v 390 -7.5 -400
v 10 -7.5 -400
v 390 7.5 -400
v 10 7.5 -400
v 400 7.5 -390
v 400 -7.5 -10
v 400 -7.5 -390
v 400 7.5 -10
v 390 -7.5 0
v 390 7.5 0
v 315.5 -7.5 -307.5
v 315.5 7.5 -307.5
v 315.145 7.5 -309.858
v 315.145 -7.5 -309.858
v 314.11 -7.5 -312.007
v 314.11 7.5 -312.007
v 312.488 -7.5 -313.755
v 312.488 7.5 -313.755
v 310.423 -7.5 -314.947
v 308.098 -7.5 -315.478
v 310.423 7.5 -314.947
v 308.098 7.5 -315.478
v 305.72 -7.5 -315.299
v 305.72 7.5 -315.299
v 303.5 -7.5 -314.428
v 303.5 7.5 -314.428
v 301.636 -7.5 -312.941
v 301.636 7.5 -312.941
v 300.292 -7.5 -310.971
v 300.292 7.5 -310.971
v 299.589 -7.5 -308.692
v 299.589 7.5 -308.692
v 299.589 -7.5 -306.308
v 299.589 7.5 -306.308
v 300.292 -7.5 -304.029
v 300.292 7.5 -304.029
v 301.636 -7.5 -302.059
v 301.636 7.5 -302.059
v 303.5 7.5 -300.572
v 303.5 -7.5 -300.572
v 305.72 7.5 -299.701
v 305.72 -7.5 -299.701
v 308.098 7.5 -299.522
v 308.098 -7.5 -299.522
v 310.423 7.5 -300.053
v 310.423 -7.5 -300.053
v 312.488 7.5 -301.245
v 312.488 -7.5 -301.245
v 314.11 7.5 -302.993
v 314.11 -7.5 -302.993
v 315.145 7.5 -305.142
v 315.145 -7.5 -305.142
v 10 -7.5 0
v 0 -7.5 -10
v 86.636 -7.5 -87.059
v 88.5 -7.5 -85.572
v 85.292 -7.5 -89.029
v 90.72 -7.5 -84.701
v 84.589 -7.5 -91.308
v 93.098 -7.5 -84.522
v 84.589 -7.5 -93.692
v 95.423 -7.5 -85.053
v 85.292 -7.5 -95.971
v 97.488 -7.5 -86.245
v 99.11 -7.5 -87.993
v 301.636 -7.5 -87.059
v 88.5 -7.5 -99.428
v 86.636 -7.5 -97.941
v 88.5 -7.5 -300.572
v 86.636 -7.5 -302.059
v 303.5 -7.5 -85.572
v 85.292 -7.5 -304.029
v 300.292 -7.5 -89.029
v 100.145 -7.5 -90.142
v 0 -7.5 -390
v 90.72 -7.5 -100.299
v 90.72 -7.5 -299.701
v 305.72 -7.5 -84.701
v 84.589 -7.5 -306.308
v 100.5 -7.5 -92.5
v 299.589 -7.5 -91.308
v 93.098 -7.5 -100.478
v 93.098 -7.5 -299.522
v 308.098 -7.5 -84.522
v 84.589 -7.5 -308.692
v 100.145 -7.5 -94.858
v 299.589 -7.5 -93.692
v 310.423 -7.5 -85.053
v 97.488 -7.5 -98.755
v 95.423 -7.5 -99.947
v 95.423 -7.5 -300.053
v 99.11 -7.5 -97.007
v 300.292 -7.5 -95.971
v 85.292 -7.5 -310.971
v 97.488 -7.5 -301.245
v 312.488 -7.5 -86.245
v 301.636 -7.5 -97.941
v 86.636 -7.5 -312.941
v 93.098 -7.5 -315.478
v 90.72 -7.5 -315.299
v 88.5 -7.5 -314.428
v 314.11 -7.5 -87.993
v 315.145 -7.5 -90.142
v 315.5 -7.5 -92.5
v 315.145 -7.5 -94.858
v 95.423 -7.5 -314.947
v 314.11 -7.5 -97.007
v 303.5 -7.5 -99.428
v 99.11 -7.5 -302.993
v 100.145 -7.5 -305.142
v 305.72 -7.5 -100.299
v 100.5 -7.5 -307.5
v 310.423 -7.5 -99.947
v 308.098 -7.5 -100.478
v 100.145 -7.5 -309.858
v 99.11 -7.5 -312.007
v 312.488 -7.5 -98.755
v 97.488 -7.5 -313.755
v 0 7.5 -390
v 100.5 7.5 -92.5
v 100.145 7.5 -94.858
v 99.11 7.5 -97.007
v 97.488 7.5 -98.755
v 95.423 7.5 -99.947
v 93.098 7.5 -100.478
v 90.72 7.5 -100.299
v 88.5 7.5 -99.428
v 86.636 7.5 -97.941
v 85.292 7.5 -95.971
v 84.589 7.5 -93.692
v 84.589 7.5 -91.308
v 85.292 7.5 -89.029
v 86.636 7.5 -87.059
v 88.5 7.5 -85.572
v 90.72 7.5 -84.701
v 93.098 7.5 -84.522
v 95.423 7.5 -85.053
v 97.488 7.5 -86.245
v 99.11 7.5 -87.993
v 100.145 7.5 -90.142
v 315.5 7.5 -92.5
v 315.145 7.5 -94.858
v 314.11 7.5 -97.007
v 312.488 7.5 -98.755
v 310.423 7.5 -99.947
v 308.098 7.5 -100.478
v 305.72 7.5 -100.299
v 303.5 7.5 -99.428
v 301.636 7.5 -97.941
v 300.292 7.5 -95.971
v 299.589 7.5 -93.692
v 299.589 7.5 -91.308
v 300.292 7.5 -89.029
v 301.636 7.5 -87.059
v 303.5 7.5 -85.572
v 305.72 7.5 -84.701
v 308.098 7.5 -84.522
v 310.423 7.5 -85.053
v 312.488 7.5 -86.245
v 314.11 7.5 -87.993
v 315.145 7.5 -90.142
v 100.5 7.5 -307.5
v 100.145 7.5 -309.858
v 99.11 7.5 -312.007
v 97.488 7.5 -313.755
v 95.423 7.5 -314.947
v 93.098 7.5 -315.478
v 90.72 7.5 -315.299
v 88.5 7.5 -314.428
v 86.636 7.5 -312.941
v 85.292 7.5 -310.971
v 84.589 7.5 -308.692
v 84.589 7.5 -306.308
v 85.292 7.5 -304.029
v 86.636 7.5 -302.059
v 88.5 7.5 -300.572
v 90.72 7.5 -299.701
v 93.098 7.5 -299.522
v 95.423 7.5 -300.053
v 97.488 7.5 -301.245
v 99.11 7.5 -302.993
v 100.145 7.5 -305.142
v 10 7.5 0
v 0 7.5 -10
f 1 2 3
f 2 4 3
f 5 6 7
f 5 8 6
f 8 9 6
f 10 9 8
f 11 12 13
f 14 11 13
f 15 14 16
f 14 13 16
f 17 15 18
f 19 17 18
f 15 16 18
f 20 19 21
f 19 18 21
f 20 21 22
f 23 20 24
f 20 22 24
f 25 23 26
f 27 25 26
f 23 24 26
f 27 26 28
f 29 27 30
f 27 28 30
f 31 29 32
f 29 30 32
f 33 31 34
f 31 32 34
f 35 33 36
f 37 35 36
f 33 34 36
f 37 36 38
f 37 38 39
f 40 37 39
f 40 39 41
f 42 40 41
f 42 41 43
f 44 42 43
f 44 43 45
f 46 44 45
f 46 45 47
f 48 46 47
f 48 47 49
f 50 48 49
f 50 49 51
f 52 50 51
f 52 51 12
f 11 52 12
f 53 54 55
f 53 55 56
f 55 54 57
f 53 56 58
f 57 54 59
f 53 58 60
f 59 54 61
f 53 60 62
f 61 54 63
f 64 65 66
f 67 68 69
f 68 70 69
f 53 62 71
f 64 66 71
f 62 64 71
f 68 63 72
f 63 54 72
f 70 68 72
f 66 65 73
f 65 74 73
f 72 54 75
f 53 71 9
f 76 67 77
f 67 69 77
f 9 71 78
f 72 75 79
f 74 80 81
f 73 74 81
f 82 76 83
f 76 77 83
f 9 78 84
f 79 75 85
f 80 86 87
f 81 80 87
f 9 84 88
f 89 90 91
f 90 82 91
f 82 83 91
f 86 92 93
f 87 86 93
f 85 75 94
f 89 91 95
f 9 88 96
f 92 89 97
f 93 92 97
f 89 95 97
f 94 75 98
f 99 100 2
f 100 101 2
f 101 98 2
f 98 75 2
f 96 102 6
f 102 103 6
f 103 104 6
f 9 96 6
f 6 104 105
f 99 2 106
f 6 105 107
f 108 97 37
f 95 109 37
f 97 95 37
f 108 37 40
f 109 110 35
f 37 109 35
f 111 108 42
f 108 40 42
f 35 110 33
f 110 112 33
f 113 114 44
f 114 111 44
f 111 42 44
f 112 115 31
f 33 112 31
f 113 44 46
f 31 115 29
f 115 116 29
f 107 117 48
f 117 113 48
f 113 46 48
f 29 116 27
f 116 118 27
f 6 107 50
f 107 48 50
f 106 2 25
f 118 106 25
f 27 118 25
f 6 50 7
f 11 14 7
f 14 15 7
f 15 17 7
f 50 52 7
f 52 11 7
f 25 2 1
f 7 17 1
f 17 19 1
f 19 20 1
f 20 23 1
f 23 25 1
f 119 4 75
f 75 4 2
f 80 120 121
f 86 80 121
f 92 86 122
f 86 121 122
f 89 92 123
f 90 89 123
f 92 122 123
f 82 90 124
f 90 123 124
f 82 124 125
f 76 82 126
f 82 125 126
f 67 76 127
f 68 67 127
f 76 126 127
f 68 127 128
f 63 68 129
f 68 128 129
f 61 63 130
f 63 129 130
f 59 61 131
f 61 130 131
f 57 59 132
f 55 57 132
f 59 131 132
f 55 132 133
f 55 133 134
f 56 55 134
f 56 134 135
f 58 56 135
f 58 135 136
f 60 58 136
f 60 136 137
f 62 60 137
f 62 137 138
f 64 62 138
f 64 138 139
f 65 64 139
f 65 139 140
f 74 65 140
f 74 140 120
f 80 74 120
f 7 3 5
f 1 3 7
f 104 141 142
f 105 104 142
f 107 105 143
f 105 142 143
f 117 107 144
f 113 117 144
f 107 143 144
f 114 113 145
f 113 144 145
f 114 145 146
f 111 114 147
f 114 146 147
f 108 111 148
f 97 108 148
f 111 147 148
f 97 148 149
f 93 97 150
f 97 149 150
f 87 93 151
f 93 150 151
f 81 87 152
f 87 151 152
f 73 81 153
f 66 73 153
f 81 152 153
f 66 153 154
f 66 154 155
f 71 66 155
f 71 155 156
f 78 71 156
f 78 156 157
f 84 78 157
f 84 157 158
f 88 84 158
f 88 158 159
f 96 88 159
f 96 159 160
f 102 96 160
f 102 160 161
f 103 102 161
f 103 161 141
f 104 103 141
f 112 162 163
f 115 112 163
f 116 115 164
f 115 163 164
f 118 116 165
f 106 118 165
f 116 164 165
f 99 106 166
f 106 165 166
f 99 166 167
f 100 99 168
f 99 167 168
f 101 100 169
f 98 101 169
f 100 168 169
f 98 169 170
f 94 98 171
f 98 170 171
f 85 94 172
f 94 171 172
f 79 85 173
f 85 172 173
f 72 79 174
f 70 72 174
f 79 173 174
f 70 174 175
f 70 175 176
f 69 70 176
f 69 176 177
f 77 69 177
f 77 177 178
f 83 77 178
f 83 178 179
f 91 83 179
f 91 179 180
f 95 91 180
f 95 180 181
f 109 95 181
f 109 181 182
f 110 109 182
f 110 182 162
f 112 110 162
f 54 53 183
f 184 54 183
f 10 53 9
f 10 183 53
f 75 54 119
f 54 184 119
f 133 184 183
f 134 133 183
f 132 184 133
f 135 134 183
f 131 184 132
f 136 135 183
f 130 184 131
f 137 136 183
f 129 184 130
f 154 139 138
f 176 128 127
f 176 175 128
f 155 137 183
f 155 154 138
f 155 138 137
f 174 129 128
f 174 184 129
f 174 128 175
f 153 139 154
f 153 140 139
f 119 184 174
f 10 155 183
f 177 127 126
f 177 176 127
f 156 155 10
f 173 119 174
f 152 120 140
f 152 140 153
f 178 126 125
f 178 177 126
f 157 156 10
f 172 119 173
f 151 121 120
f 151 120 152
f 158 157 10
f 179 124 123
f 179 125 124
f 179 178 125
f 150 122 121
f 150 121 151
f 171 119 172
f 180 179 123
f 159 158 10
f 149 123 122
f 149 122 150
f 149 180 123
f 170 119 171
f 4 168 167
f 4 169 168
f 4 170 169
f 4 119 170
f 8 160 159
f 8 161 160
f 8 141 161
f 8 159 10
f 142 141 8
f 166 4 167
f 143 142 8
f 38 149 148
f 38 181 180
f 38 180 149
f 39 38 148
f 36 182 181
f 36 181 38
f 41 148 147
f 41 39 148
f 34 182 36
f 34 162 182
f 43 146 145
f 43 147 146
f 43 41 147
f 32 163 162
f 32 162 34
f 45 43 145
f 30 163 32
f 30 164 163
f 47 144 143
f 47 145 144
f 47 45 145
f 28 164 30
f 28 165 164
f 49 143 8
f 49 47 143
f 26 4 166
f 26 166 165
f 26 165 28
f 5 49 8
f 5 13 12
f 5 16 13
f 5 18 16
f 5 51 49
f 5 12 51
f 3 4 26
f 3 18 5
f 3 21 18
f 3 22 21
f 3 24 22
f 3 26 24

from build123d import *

# Parameters (mm, degrees)
SKETCH1_W           = 400
SKETCH1_H           = 400
BOSS_EXTRUDE1_DEPTH = 7.5
CHAMFER1_SIZE       = 10
SKETCH3_R           = 8
CUT_EXTRUDE1_DEPTH  = 16


with BuildPart() as part:
    # Sketch1 → Boss-Extrude1 (new body, symmetric)
    with BuildSketch(Plane(origin=(0, 0, 0), x_dir=(1, 0, 0), z_dir=(0, 1, 0))):
        with Locations((200, 200)):
            Rectangle(SKETCH1_W, SKETCH1_H)
    extrude(amount=BOSS_EXTRUDE1_DEPTH, both=True)

    # Chamfer1
    chamfer1_edges = [part.edges().sort_by_distance(p)[0] for p in [
        (0, 0, -400),
        (400, 0, -400),
        (400, 0, 0),
        (0, 0, 0),
    ]]
    chamfer(chamfer1_edges, length=CHAMFER1_SIZE)

    # Sketch3 → Cut-Extrude1 (cut)
    with BuildSketch(Plane(origin=(0, 7.5, 0), x_dir=(1, 0, 0), z_dir=(0, 1, 0))):
        with Locations((307.5, 307.5)):
            Circle(SKETCH3_R)
        with Locations((307.5, 92.5)):
            Circle(SKETCH3_R)
        with Locations((92.5, 92.5)):
            Circle(SKETCH3_R)
        with Locations((92.5, 307.5)):
            Circle(SKETCH3_R)
    extrude(amount=-CUT_EXTRUDE1_DEPTH, mode=Mode.SUBTRACT)


solid = part.part
